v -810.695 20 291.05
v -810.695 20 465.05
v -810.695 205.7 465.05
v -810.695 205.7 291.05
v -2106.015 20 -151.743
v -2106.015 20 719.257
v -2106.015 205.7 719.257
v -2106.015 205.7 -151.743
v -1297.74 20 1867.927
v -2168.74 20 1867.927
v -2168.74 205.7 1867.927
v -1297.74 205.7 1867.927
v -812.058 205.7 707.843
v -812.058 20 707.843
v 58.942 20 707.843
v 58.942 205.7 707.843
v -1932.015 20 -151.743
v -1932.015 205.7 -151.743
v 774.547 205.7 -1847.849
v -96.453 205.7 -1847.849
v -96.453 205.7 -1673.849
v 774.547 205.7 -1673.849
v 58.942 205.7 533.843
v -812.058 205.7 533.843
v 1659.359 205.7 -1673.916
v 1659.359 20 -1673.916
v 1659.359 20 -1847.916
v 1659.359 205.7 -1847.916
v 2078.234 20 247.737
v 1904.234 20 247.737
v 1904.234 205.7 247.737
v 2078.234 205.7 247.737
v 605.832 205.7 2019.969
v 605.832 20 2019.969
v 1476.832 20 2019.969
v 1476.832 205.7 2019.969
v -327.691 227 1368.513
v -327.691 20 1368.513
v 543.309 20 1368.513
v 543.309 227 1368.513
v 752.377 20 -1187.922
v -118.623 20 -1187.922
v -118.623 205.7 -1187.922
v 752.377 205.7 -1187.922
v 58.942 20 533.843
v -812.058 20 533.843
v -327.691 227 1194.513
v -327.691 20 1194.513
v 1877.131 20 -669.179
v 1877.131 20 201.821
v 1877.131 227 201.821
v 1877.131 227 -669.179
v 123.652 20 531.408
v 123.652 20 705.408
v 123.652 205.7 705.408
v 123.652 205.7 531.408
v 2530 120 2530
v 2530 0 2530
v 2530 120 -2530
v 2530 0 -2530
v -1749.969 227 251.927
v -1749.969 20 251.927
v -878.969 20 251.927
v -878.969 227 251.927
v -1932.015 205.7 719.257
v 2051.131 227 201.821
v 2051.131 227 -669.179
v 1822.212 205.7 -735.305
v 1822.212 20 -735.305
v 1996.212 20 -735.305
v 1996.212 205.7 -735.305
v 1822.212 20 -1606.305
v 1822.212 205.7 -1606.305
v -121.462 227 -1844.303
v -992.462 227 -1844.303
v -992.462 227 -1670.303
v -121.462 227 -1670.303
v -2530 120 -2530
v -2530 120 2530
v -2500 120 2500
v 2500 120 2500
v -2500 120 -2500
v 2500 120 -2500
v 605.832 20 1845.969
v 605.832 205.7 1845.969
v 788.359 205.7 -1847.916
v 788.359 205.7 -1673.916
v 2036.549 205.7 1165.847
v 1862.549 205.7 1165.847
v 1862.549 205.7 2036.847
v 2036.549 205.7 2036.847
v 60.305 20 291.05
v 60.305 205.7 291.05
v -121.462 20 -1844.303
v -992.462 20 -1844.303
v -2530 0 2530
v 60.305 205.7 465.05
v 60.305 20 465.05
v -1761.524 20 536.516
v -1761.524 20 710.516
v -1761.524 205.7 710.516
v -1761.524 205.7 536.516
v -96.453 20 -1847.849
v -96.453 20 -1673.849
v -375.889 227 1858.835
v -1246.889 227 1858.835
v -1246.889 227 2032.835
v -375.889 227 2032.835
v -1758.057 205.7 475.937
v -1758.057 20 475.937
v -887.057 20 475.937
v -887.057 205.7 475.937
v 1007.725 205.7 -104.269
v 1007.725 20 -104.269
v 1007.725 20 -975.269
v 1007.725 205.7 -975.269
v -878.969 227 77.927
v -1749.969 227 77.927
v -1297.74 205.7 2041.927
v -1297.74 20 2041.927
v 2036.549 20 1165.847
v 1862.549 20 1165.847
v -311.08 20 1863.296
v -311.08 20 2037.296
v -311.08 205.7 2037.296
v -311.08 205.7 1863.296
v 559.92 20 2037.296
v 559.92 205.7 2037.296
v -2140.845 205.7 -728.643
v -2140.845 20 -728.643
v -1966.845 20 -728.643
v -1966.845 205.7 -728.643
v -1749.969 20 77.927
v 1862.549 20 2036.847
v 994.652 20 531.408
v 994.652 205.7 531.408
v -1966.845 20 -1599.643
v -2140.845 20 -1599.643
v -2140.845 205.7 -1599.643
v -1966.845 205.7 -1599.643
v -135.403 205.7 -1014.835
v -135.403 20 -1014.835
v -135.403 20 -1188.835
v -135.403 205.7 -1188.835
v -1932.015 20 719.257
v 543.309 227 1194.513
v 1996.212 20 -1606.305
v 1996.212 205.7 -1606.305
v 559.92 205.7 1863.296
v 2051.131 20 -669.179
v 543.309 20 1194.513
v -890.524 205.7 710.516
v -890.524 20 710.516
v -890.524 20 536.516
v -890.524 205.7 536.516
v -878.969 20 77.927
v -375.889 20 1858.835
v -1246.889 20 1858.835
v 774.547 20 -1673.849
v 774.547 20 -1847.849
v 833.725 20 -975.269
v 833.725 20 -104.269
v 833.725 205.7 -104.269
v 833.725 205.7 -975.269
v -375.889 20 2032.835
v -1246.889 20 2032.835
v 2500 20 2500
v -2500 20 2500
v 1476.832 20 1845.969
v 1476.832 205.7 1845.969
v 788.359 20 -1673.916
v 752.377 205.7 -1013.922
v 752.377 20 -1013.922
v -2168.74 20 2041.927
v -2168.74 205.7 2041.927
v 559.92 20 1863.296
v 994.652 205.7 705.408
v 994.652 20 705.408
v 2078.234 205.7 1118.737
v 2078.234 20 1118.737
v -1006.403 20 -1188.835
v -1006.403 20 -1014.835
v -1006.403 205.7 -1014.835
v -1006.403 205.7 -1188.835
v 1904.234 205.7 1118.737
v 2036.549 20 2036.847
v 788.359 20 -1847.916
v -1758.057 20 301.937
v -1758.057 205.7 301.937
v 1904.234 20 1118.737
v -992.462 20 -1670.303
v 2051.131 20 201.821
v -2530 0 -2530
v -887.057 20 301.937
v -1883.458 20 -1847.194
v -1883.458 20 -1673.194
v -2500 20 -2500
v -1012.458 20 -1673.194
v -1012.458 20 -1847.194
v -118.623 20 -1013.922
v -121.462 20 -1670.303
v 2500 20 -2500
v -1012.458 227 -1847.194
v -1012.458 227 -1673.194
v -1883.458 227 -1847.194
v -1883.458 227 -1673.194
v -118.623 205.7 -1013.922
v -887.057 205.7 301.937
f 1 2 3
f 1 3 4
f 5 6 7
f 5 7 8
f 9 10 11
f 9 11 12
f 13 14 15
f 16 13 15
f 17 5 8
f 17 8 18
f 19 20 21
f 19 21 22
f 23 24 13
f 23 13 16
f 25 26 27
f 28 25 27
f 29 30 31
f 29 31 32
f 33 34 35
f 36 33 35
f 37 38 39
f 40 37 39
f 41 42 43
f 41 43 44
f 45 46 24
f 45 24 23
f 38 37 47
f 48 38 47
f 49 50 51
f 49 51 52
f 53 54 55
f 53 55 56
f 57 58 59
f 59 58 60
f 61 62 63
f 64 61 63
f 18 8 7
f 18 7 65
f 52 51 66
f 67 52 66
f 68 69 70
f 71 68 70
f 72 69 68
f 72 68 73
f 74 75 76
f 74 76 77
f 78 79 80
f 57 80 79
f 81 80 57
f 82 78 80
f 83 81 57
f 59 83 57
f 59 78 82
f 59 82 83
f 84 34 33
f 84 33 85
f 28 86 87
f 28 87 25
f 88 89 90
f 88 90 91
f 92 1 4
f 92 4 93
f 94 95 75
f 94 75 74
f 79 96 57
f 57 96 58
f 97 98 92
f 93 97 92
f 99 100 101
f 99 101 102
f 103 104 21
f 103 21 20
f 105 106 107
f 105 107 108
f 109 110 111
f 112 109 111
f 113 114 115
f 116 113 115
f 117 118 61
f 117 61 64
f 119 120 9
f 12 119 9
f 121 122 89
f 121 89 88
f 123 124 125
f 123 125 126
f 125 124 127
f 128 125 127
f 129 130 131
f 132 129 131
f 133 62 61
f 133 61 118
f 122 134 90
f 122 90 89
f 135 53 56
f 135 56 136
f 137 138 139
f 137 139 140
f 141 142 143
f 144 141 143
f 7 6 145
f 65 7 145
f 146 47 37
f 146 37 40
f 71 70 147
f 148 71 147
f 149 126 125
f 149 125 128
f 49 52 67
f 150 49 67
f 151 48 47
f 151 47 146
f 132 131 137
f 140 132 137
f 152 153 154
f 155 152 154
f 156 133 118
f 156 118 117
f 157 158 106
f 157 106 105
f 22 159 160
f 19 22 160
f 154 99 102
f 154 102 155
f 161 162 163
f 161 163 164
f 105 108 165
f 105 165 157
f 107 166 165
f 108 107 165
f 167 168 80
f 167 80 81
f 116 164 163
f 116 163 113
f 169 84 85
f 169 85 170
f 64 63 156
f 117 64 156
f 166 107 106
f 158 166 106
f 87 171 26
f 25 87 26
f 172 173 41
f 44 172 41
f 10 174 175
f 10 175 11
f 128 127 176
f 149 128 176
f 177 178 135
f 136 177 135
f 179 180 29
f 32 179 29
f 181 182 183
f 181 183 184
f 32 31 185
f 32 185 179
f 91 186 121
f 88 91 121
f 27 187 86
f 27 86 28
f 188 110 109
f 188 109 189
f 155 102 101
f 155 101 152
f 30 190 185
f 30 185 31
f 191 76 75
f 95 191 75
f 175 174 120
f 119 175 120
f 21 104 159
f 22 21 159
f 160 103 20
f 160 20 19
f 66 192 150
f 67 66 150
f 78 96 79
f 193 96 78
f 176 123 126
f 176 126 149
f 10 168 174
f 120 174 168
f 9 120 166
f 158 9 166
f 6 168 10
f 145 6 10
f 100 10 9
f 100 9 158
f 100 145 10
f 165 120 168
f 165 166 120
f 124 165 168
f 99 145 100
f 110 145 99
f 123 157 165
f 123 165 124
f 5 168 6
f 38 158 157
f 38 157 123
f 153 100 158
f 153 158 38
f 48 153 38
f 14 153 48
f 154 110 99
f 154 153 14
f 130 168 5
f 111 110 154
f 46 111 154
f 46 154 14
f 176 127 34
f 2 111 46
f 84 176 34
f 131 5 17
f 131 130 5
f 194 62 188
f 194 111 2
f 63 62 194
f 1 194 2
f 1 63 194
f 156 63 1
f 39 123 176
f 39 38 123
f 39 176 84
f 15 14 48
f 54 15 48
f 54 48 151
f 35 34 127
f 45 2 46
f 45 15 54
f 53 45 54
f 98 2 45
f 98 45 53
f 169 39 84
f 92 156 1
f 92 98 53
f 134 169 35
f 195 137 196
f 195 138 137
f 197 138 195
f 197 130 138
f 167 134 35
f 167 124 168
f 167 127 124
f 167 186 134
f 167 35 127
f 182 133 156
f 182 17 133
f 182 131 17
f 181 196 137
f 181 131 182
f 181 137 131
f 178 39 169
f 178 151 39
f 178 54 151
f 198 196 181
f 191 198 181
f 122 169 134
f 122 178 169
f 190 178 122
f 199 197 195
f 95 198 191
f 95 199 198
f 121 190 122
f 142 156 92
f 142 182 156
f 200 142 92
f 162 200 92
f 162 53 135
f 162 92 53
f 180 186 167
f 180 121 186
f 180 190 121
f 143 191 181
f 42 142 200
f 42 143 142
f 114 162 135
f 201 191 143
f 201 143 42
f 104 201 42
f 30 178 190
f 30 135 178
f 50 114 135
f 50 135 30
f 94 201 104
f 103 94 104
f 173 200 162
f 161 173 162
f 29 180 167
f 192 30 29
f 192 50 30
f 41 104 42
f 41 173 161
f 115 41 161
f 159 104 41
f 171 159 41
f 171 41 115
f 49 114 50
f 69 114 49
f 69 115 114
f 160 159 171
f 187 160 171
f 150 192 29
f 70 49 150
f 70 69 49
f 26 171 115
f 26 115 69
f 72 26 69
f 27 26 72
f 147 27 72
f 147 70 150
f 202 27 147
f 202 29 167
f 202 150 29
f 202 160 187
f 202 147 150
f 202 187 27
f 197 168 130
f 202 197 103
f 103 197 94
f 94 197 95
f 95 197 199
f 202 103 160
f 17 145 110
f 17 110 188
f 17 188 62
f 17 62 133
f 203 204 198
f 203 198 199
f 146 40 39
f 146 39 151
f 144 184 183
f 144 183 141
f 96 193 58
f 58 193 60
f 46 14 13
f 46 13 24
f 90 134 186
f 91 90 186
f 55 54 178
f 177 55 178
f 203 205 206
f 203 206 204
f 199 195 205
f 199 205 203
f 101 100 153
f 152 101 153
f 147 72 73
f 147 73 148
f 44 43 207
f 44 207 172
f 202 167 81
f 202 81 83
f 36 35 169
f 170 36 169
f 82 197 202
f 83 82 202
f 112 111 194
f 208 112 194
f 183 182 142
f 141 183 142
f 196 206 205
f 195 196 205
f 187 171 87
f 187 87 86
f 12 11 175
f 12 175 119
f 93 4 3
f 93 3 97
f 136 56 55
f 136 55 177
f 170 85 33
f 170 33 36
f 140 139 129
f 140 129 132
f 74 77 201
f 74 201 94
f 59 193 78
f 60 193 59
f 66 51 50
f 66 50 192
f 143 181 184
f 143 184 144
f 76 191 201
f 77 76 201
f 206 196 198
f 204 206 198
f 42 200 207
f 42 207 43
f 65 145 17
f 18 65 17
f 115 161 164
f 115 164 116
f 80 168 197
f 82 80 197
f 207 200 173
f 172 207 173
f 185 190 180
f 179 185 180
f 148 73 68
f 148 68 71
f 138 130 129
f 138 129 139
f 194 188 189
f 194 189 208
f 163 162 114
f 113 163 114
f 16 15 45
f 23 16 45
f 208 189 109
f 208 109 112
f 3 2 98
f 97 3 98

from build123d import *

# Parameters (mm, degrees)
IZIM2_W                      = 5060
IZIM2_H                      = 5060
Y_KSEKLIK_EKSTR_ZYON1_DEPTH  = 20
IZIM3_W                      = 5060
IZIM3_H                      = 5060
IZIM3_W_2                    = 5000
IZIM3_H_2                    = 5000
Y_KSEKLIK_EKSTR_ZYON2_DEPTH  = 100
IZIM4_W                      = 871
IZIM4_H                      = 174
Y_KSEKLIK_EKSTR_ZYON3_DEPTH  = 207
IZIM5_W                      = 871
IZIM5_H                      = 174
Y_KSEKLIK_EKSTR_ZYON4_DEPTH  = 207
IZIM6_W                      = 871
IZIM6_H                      = 174
Y_KSEKLIK_EKSTR_ZYON5_DEPTH  = 185.7
IZIM7_W                      = 871
IZIM7_H                      = 174
Y_KSEKLIK_EKSTR_ZYON6_DEPTH  = 185.7
IZIM8_W                      = 871
IZIM8_H                      = 174
Y_KSEKLIK_EKSTR_ZYON7_DEPTH  = 185.7
IZIM9_W                      = 871
IZIM9_H                      = 174
Y_KSEKLIK_EKSTR_ZYON8_DEPTH  = 185.7
IZIM10_W                     = 871
IZIM10_H                     = 174
Y_KSEKLIK_EKSTR_ZYON9_DEPTH  = 207
IZIM11_W                     = 871
IZIM11_H                     = 174
Y_KSEKLIK_EKSTR_ZYON10_DEPTH = 185.7
IZIM12_W                     = 871
IZIM12_H                     = 174
Y_KSEKLIK_EKSTR_ZYON11_DEPTH = 185.7
IZIM18_W                     = 174
IZIM18_H                     = 871
Y_KSEKLIK_EKSTR_ZYON12_DEPTH = 185.7
IZIM13_W                     = 174
IZIM13_H                     = 871
Y_KSEKLIK_EKSTR_ZYON13_DEPTH = 185.7
IZIM17_W                     = 174
IZIM17_H                     = 871
Y_KSEKLIK_EKSTR_ZYON14_DEPTH = 207
IZIM19_W                     = 174
IZIM19_H                     = 871
Y_KSEKLIK_EKSTR_ZYON15_DEPTH = 185.7
IZIM20_W                     = 174
IZIM20_H                     = 871
Y_KSEKLIK_EKSTR_ZYON16_DEPTH = 185.7
IZIM21_W                     = 174
IZIM21_H                     = 871
Y_KSEKLIK_EKSTR_ZYON17_DEPTH = 185.7
IZIM22_W                     = 871
IZIM22_H                     = 174
Y_KSEKLIK_EKSTR_ZYON18_DEPTH = 185.7
IZIM23_W                     = 871
IZIM23_H                     = 174
Y_KSEKLIK_EKSTR_ZYON19_DEPTH = 185.7
IZIM24_W                     = 871
IZIM24_H                     = 174
Y_KSEKLIK_EKSTR_ZYON20_DEPTH = 185.7
IZIM25_W                     = 871
IZIM25_H                     = 174
Y_KSEKLIK_EKSTR_ZYON21_DEPTH = 207
IZIM26_W                     = 871
IZIM26_H                     = 174
Y_KSEKLIK_EKSTR_ZYON22_DEPTH = 185.7
IZIM28_W                     = 871
IZIM28_H                     = 174
Y_KSEKLIK_EKSTR_ZYON23_DEPTH = 207
IZIM27_W                     = 871
IZIM27_H                     = 174
Y_KSEKLIK_EKSTR_ZYON24_DEPTH = 185.7
IZIM29_W                     = 871
IZIM29_H                     = 174
Y_KSEKLIK_EKSTR_ZYON25_DEPTH = 185.7
IZIM30_W                     = 174
IZIM30_H                     = 871
Y_KSEKLIK_EKSTR_ZYON26_DEPTH = 185.7


with BuildPart() as part:
    # Çizim2 → Yükseklik-Ekstrüzyon1 (new body)
    with BuildSketch(Plane(origin=(0, 0, 0), x_dir=(1, 0, 0), z_dir=(0, 1, 0))):
        Rectangle(IZIM2_W, IZIM2_H)
    extrude(amount=Y_KSEKLIK_EKSTR_ZYON1_DEPTH)

    # Çizim3 → Yükseklik-Ekstrüzyon2 (add)
    with BuildSketch(Plane(origin=(0, 20, 0), x_dir=(1, 0, 0), z_dir=(0, 1, 0))):
        Rectangle(IZIM3_W, IZIM3_H)
        Rectangle(IZIM3_W_2, IZIM3_H_2, mode=Mode.SUBTRACT)
    extrude(amount=Y_KSEKLIK_EKSTR_ZYON2_DEPTH)

    # Çizim4 → Yükseklik-Ekstrüzyon3 (add)
    with BuildSketch(Plane(origin=(0, 20, 0), x_dir=(1, 0, 0), z_dir=(0, 1, 0))):
        with Locations((-1447.957868124, 1760.193885562)):
            Rectangle(IZIM4_W, IZIM4_H)
    extrude(amount=Y_KSEKLIK_EKSTR_ZYON3_DEPTH)

    # Çizim5 → Yükseklik-Ekstrüzyon4 (add)
    with BuildSketch(Plane(origin=(0, 20, 0), x_dir=(1, 0, 0), z_dir=(0, 1, 0))):
        with Locations((-556.962470649, 1757.302581604)):
            Rectangle(IZIM5_W, IZIM5_H)
    extrude(amount=Y_KSEKLIK_EKSTR_ZYON4_DEPTH)

    # Çizim6 → Yükseklik-Ekstrüzyon5 (add)
    with BuildSketch(Plane(origin=(0, 20, 0), x_dir=(1, 0, 0), z_dir=(0, 1, 0))):
        with Locations((339.047077841, 1760.84910081)):
            Rectangle(IZIM6_W, IZIM6_H)
    extrude(amount=Y_KSEKLIK_EKSTR_ZYON5_DEPTH)

    # Çizim7 → Yükseklik-Ekstrüzyon6 (add)
    with BuildSketch(Plane(origin=(0, 20, 0), x_dir=(1, 0, 0), z_dir=(0, 1, 0))):
        with Locations((-570.903208445, 1101.835490201)):
            Rectangle(IZIM7_W, IZIM7_H)
    extrude(amount=Y_KSEKLIK_EKSTR_ZYON6_DEPTH)

    # Çizim8 → Yükseklik-Ekstrüzyon7 (add)
    with BuildSketch(Plane(origin=(0, 20, 0), x_dir=(1, 0, 0), z_dir=(0, 1, 0))):
        with Locations((316.876659873, 1100.921994771)):
            Rectangle(IZIM8_W, IZIM8_H)
    extrude(amount=Y_KSEKLIK_EKSTR_ZYON7_DEPTH)

    # Çizim9 → Yükseklik-Ekstrüzyon8 (add)
    with BuildSketch(Plane(origin=(0, 20, 0), x_dir=(1, 0, 0), z_dir=(0, 1, 0))):
        with Locations((-375.195016834, -378.049975519)):
            Rectangle(IZIM9_W, IZIM9_H)
    extrude(amount=Y_KSEKLIK_EKSTR_ZYON8_DEPTH)

    # Çizim10 → Yükseklik-Ekstrüzyon9 (add)
    with BuildSketch(Plane(origin=(0, 20, 0), x_dir=(1, 0, 0), z_dir=(0, 1, 0))):
        with Locations((-1314.468607653, -164.926600722)):
            Rectangle(IZIM10_W, IZIM10_H)
    extrude(amount=Y_KSEKLIK_EKSTR_ZYON9_DEPTH)

    # Çizim11 → Yükseklik-Ekstrüzyon10 (add)
    with BuildSketch(Plane(origin=(0, 20, 0), x_dir=(1, 0, 0), z_dir=(0, 1, 0))):
        with Locations((1041.332284797, -1932.969392618)):
            Rectangle(IZIM11_W, IZIM11_H)
    extrude(amount=Y_KSEKLIK_EKSTR_ZYON10_DEPTH)

    # Çizim12 → Yükseklik-Ekstrüzyon11 (add)
    with BuildSketch(Plane(origin=(0, 20, 0), x_dir=(1, 0, 0), z_dir=(0, 1, 0))):
        with Locations((1223.858831325, 1760.916349533)):
            Rectangle(IZIM12_W, IZIM12_H)
    extrude(amount=Y_KSEKLIK_EKSTR_ZYON11_DEPTH)

    # Çizim18 → Yükseklik-Ekstrüzyon12 (add)
    with BuildSketch(Plane(origin=(0, 20, 0), x_dir=(1, 0, 0), z_dir=(0, 1, 0))):
        with Locations((1991.233510758, -683.237447543)):
            Rectangle(IZIM18_W, IZIM18_H)
    extrude(amount=Y_KSEKLIK_EKSTR_ZYON12_DEPTH)

    # Çizim13 → Yükseklik-Ekstrüzyon13 (add)
    with BuildSketch(Plane(origin=(0, 20, 0), x_dir=(1, 0, 0), z_dir=(0, 1, 0))):
        with Locations((1909.211579927, 1170.80509888)):
            Rectangle(IZIM13_W, IZIM13_H)
    extrude(amount=Y_KSEKLIK_EKSTR_ZYON13_DEPTH)

    # Çizim17 → Yükseklik-Ekstrüzyon14 (add)
    with BuildSketch(Plane(origin=(0, 20, 0), x_dir=(1, 0, 0), z_dir=(0, 1, 0))):
        with Locations((1964.13053487, 233.678603717)):
            Rectangle(IZIM17_W, IZIM17_H)
    extrude(amount=Y_KSEKLIK_EKSTR_ZYON14_DEPTH)

    # Çizim19 → Yükseklik-Ekstrüzyon15 (add)
    with BuildSketch(Plane(origin=(0, 20, 0), x_dir=(1, 0, 0), z_dir=(0, 1, 0))):
        with Locations((-2053.844695073, 1164.143387532)):
            Rectangle(IZIM19_W, IZIM19_H)
    extrude(amount=Y_KSEKLIK_EKSTR_ZYON15_DEPTH)

    # Çizim20 → Yükseklik-Ekstrüzyon16 (add)
    with BuildSketch(Plane(origin=(0, 20, 0), x_dir=(1, 0, 0), z_dir=(0, 1, 0))):
        with Locations((920.72498976, 539.769496495)):
            Rectangle(IZIM20_W, IZIM20_H)
    extrude(amount=Y_KSEKLIK_EKSTR_ZYON16_DEPTH)

    # Çizim21 → Yükseklik-Ekstrüzyon17 (add)
    with BuildSketch(Plane(origin=(0, 20, 0), x_dir=(1, 0, 0), z_dir=(0, 1, 0))):
        with Locations((1949.549104769, -1601.346637864)):
            Rectangle(IZIM21_W, IZIM21_H)
    extrude(amount=Y_KSEKLIK_EKSTR_ZYON17_DEPTH)

    # Çizim22 → Yükseklik-Ekstrüzyon18 (add)
    with BuildSketch(Plane(origin=(0, 20, 0), x_dir=(1, 0, 0), z_dir=(0, 1, 0))):
        with Locations((-376.557557317, -620.842933612)):
            Rectangle(IZIM22_W, IZIM22_H)
    extrude(amount=Y_KSEKLIK_EKSTR_ZYON18_DEPTH)

    # Çizim23 → Yükseklik-Ekstrüzyon19 (add)
    with BuildSketch(Plane(origin=(0, 20, 0), x_dir=(1, 0, 0), z_dir=(0, 1, 0))):
        with Locations((-1326.024111416, -623.516452973)):
            Rectangle(IZIM23_W, IZIM23_H)
    extrude(amount=Y_KSEKLIK_EKSTR_ZYON19_DEPTH)

    # Çizim24 → Yükseklik-Ekstrüzyon20 (add)
    with BuildSketch(Plane(origin=(0, 20, 0), x_dir=(1, 0, 0), z_dir=(0, 1, 0))):
        with Locations((-1322.557004683, -388.936544417)):
            Rectangle(IZIM24_W, IZIM24_H)
    extrude(amount=Y_KSEKLIK_EKSTR_ZYON20_DEPTH)

    # Çizim25 → Yükseklik-Ekstrüzyon21 (add)
    with BuildSketch(Plane(origin=(0, 20, 0), x_dir=(1, 0, 0), z_dir=(0, 1, 0))):
        with Locations((107.808561485, -1281.512558826)):
            Rectangle(IZIM25_W, IZIM25_H)
    extrude(amount=Y_KSEKLIK_EKSTR_ZYON21_DEPTH)

    # Çizim26 → Yükseklik-Ekstrüzyon22 (add)
    with BuildSketch(Plane(origin=(0, 20, 0), x_dir=(1, 0, 0), z_dir=(0, 1, 0))):
        with Locations((559.151520406, -618.408042064)):
            Rectangle(IZIM26_W, IZIM26_H)
    extrude(amount=Y_KSEKLIK_EKSTR_ZYON22_DEPTH)

    # Çizim28 → Yükseklik-Ekstrüzyon23 (add)
    with BuildSketch(Plane(origin=(0, 20, 0), x_dir=(1, 0, 0), z_dir=(0, 1, 0))):
        with Locations((-811.388936297, -1945.834521363)):
            Rectangle(IZIM28_W, IZIM28_H)
    extrude(amount=Y_KSEKLIK_EKSTR_ZYON23_DEPTH)

    # Çizim27 → Yükseklik-Ekstrüzyon24 (add)
    with BuildSketch(Plane(origin=(0, 20, 0), x_dir=(1, 0, 0), z_dir=(0, 1, 0))):
        with Locations((124.420483528, -1950.295529657)):
            Rectangle(IZIM27_W, IZIM27_H)
    extrude(amount=Y_KSEKLIK_EKSTR_ZYON24_DEPTH)

    # Çizim29 → Yükseklik-Ekstrüzyon25 (add)
    with BuildSketch(Plane(origin=(0, 20, 0), x_dir=(1, 0, 0), z_dir=(0, 1, 0))):
        with Locations((-1733.240195544, -1954.926684942)):
            Rectangle(IZIM29_W, IZIM29_H)
    extrude(amount=Y_KSEKLIK_EKSTR_ZYON25_DEPTH)

    # Çizim30 → Yükseklik-Ekstrüzyon26 (add)
    with BuildSketch(Plane(origin=(0, 20, 0), x_dir=(1, 0, 0), z_dir=(0, 1, 0))):
        with Locations((-2019.015377363, -283.756951612)):
            Rectangle(IZIM30_W, IZIM30_H)
    extrude(amount=Y_KSEKLIK_EKSTR_ZYON26_DEPTH)


solid = part.part
